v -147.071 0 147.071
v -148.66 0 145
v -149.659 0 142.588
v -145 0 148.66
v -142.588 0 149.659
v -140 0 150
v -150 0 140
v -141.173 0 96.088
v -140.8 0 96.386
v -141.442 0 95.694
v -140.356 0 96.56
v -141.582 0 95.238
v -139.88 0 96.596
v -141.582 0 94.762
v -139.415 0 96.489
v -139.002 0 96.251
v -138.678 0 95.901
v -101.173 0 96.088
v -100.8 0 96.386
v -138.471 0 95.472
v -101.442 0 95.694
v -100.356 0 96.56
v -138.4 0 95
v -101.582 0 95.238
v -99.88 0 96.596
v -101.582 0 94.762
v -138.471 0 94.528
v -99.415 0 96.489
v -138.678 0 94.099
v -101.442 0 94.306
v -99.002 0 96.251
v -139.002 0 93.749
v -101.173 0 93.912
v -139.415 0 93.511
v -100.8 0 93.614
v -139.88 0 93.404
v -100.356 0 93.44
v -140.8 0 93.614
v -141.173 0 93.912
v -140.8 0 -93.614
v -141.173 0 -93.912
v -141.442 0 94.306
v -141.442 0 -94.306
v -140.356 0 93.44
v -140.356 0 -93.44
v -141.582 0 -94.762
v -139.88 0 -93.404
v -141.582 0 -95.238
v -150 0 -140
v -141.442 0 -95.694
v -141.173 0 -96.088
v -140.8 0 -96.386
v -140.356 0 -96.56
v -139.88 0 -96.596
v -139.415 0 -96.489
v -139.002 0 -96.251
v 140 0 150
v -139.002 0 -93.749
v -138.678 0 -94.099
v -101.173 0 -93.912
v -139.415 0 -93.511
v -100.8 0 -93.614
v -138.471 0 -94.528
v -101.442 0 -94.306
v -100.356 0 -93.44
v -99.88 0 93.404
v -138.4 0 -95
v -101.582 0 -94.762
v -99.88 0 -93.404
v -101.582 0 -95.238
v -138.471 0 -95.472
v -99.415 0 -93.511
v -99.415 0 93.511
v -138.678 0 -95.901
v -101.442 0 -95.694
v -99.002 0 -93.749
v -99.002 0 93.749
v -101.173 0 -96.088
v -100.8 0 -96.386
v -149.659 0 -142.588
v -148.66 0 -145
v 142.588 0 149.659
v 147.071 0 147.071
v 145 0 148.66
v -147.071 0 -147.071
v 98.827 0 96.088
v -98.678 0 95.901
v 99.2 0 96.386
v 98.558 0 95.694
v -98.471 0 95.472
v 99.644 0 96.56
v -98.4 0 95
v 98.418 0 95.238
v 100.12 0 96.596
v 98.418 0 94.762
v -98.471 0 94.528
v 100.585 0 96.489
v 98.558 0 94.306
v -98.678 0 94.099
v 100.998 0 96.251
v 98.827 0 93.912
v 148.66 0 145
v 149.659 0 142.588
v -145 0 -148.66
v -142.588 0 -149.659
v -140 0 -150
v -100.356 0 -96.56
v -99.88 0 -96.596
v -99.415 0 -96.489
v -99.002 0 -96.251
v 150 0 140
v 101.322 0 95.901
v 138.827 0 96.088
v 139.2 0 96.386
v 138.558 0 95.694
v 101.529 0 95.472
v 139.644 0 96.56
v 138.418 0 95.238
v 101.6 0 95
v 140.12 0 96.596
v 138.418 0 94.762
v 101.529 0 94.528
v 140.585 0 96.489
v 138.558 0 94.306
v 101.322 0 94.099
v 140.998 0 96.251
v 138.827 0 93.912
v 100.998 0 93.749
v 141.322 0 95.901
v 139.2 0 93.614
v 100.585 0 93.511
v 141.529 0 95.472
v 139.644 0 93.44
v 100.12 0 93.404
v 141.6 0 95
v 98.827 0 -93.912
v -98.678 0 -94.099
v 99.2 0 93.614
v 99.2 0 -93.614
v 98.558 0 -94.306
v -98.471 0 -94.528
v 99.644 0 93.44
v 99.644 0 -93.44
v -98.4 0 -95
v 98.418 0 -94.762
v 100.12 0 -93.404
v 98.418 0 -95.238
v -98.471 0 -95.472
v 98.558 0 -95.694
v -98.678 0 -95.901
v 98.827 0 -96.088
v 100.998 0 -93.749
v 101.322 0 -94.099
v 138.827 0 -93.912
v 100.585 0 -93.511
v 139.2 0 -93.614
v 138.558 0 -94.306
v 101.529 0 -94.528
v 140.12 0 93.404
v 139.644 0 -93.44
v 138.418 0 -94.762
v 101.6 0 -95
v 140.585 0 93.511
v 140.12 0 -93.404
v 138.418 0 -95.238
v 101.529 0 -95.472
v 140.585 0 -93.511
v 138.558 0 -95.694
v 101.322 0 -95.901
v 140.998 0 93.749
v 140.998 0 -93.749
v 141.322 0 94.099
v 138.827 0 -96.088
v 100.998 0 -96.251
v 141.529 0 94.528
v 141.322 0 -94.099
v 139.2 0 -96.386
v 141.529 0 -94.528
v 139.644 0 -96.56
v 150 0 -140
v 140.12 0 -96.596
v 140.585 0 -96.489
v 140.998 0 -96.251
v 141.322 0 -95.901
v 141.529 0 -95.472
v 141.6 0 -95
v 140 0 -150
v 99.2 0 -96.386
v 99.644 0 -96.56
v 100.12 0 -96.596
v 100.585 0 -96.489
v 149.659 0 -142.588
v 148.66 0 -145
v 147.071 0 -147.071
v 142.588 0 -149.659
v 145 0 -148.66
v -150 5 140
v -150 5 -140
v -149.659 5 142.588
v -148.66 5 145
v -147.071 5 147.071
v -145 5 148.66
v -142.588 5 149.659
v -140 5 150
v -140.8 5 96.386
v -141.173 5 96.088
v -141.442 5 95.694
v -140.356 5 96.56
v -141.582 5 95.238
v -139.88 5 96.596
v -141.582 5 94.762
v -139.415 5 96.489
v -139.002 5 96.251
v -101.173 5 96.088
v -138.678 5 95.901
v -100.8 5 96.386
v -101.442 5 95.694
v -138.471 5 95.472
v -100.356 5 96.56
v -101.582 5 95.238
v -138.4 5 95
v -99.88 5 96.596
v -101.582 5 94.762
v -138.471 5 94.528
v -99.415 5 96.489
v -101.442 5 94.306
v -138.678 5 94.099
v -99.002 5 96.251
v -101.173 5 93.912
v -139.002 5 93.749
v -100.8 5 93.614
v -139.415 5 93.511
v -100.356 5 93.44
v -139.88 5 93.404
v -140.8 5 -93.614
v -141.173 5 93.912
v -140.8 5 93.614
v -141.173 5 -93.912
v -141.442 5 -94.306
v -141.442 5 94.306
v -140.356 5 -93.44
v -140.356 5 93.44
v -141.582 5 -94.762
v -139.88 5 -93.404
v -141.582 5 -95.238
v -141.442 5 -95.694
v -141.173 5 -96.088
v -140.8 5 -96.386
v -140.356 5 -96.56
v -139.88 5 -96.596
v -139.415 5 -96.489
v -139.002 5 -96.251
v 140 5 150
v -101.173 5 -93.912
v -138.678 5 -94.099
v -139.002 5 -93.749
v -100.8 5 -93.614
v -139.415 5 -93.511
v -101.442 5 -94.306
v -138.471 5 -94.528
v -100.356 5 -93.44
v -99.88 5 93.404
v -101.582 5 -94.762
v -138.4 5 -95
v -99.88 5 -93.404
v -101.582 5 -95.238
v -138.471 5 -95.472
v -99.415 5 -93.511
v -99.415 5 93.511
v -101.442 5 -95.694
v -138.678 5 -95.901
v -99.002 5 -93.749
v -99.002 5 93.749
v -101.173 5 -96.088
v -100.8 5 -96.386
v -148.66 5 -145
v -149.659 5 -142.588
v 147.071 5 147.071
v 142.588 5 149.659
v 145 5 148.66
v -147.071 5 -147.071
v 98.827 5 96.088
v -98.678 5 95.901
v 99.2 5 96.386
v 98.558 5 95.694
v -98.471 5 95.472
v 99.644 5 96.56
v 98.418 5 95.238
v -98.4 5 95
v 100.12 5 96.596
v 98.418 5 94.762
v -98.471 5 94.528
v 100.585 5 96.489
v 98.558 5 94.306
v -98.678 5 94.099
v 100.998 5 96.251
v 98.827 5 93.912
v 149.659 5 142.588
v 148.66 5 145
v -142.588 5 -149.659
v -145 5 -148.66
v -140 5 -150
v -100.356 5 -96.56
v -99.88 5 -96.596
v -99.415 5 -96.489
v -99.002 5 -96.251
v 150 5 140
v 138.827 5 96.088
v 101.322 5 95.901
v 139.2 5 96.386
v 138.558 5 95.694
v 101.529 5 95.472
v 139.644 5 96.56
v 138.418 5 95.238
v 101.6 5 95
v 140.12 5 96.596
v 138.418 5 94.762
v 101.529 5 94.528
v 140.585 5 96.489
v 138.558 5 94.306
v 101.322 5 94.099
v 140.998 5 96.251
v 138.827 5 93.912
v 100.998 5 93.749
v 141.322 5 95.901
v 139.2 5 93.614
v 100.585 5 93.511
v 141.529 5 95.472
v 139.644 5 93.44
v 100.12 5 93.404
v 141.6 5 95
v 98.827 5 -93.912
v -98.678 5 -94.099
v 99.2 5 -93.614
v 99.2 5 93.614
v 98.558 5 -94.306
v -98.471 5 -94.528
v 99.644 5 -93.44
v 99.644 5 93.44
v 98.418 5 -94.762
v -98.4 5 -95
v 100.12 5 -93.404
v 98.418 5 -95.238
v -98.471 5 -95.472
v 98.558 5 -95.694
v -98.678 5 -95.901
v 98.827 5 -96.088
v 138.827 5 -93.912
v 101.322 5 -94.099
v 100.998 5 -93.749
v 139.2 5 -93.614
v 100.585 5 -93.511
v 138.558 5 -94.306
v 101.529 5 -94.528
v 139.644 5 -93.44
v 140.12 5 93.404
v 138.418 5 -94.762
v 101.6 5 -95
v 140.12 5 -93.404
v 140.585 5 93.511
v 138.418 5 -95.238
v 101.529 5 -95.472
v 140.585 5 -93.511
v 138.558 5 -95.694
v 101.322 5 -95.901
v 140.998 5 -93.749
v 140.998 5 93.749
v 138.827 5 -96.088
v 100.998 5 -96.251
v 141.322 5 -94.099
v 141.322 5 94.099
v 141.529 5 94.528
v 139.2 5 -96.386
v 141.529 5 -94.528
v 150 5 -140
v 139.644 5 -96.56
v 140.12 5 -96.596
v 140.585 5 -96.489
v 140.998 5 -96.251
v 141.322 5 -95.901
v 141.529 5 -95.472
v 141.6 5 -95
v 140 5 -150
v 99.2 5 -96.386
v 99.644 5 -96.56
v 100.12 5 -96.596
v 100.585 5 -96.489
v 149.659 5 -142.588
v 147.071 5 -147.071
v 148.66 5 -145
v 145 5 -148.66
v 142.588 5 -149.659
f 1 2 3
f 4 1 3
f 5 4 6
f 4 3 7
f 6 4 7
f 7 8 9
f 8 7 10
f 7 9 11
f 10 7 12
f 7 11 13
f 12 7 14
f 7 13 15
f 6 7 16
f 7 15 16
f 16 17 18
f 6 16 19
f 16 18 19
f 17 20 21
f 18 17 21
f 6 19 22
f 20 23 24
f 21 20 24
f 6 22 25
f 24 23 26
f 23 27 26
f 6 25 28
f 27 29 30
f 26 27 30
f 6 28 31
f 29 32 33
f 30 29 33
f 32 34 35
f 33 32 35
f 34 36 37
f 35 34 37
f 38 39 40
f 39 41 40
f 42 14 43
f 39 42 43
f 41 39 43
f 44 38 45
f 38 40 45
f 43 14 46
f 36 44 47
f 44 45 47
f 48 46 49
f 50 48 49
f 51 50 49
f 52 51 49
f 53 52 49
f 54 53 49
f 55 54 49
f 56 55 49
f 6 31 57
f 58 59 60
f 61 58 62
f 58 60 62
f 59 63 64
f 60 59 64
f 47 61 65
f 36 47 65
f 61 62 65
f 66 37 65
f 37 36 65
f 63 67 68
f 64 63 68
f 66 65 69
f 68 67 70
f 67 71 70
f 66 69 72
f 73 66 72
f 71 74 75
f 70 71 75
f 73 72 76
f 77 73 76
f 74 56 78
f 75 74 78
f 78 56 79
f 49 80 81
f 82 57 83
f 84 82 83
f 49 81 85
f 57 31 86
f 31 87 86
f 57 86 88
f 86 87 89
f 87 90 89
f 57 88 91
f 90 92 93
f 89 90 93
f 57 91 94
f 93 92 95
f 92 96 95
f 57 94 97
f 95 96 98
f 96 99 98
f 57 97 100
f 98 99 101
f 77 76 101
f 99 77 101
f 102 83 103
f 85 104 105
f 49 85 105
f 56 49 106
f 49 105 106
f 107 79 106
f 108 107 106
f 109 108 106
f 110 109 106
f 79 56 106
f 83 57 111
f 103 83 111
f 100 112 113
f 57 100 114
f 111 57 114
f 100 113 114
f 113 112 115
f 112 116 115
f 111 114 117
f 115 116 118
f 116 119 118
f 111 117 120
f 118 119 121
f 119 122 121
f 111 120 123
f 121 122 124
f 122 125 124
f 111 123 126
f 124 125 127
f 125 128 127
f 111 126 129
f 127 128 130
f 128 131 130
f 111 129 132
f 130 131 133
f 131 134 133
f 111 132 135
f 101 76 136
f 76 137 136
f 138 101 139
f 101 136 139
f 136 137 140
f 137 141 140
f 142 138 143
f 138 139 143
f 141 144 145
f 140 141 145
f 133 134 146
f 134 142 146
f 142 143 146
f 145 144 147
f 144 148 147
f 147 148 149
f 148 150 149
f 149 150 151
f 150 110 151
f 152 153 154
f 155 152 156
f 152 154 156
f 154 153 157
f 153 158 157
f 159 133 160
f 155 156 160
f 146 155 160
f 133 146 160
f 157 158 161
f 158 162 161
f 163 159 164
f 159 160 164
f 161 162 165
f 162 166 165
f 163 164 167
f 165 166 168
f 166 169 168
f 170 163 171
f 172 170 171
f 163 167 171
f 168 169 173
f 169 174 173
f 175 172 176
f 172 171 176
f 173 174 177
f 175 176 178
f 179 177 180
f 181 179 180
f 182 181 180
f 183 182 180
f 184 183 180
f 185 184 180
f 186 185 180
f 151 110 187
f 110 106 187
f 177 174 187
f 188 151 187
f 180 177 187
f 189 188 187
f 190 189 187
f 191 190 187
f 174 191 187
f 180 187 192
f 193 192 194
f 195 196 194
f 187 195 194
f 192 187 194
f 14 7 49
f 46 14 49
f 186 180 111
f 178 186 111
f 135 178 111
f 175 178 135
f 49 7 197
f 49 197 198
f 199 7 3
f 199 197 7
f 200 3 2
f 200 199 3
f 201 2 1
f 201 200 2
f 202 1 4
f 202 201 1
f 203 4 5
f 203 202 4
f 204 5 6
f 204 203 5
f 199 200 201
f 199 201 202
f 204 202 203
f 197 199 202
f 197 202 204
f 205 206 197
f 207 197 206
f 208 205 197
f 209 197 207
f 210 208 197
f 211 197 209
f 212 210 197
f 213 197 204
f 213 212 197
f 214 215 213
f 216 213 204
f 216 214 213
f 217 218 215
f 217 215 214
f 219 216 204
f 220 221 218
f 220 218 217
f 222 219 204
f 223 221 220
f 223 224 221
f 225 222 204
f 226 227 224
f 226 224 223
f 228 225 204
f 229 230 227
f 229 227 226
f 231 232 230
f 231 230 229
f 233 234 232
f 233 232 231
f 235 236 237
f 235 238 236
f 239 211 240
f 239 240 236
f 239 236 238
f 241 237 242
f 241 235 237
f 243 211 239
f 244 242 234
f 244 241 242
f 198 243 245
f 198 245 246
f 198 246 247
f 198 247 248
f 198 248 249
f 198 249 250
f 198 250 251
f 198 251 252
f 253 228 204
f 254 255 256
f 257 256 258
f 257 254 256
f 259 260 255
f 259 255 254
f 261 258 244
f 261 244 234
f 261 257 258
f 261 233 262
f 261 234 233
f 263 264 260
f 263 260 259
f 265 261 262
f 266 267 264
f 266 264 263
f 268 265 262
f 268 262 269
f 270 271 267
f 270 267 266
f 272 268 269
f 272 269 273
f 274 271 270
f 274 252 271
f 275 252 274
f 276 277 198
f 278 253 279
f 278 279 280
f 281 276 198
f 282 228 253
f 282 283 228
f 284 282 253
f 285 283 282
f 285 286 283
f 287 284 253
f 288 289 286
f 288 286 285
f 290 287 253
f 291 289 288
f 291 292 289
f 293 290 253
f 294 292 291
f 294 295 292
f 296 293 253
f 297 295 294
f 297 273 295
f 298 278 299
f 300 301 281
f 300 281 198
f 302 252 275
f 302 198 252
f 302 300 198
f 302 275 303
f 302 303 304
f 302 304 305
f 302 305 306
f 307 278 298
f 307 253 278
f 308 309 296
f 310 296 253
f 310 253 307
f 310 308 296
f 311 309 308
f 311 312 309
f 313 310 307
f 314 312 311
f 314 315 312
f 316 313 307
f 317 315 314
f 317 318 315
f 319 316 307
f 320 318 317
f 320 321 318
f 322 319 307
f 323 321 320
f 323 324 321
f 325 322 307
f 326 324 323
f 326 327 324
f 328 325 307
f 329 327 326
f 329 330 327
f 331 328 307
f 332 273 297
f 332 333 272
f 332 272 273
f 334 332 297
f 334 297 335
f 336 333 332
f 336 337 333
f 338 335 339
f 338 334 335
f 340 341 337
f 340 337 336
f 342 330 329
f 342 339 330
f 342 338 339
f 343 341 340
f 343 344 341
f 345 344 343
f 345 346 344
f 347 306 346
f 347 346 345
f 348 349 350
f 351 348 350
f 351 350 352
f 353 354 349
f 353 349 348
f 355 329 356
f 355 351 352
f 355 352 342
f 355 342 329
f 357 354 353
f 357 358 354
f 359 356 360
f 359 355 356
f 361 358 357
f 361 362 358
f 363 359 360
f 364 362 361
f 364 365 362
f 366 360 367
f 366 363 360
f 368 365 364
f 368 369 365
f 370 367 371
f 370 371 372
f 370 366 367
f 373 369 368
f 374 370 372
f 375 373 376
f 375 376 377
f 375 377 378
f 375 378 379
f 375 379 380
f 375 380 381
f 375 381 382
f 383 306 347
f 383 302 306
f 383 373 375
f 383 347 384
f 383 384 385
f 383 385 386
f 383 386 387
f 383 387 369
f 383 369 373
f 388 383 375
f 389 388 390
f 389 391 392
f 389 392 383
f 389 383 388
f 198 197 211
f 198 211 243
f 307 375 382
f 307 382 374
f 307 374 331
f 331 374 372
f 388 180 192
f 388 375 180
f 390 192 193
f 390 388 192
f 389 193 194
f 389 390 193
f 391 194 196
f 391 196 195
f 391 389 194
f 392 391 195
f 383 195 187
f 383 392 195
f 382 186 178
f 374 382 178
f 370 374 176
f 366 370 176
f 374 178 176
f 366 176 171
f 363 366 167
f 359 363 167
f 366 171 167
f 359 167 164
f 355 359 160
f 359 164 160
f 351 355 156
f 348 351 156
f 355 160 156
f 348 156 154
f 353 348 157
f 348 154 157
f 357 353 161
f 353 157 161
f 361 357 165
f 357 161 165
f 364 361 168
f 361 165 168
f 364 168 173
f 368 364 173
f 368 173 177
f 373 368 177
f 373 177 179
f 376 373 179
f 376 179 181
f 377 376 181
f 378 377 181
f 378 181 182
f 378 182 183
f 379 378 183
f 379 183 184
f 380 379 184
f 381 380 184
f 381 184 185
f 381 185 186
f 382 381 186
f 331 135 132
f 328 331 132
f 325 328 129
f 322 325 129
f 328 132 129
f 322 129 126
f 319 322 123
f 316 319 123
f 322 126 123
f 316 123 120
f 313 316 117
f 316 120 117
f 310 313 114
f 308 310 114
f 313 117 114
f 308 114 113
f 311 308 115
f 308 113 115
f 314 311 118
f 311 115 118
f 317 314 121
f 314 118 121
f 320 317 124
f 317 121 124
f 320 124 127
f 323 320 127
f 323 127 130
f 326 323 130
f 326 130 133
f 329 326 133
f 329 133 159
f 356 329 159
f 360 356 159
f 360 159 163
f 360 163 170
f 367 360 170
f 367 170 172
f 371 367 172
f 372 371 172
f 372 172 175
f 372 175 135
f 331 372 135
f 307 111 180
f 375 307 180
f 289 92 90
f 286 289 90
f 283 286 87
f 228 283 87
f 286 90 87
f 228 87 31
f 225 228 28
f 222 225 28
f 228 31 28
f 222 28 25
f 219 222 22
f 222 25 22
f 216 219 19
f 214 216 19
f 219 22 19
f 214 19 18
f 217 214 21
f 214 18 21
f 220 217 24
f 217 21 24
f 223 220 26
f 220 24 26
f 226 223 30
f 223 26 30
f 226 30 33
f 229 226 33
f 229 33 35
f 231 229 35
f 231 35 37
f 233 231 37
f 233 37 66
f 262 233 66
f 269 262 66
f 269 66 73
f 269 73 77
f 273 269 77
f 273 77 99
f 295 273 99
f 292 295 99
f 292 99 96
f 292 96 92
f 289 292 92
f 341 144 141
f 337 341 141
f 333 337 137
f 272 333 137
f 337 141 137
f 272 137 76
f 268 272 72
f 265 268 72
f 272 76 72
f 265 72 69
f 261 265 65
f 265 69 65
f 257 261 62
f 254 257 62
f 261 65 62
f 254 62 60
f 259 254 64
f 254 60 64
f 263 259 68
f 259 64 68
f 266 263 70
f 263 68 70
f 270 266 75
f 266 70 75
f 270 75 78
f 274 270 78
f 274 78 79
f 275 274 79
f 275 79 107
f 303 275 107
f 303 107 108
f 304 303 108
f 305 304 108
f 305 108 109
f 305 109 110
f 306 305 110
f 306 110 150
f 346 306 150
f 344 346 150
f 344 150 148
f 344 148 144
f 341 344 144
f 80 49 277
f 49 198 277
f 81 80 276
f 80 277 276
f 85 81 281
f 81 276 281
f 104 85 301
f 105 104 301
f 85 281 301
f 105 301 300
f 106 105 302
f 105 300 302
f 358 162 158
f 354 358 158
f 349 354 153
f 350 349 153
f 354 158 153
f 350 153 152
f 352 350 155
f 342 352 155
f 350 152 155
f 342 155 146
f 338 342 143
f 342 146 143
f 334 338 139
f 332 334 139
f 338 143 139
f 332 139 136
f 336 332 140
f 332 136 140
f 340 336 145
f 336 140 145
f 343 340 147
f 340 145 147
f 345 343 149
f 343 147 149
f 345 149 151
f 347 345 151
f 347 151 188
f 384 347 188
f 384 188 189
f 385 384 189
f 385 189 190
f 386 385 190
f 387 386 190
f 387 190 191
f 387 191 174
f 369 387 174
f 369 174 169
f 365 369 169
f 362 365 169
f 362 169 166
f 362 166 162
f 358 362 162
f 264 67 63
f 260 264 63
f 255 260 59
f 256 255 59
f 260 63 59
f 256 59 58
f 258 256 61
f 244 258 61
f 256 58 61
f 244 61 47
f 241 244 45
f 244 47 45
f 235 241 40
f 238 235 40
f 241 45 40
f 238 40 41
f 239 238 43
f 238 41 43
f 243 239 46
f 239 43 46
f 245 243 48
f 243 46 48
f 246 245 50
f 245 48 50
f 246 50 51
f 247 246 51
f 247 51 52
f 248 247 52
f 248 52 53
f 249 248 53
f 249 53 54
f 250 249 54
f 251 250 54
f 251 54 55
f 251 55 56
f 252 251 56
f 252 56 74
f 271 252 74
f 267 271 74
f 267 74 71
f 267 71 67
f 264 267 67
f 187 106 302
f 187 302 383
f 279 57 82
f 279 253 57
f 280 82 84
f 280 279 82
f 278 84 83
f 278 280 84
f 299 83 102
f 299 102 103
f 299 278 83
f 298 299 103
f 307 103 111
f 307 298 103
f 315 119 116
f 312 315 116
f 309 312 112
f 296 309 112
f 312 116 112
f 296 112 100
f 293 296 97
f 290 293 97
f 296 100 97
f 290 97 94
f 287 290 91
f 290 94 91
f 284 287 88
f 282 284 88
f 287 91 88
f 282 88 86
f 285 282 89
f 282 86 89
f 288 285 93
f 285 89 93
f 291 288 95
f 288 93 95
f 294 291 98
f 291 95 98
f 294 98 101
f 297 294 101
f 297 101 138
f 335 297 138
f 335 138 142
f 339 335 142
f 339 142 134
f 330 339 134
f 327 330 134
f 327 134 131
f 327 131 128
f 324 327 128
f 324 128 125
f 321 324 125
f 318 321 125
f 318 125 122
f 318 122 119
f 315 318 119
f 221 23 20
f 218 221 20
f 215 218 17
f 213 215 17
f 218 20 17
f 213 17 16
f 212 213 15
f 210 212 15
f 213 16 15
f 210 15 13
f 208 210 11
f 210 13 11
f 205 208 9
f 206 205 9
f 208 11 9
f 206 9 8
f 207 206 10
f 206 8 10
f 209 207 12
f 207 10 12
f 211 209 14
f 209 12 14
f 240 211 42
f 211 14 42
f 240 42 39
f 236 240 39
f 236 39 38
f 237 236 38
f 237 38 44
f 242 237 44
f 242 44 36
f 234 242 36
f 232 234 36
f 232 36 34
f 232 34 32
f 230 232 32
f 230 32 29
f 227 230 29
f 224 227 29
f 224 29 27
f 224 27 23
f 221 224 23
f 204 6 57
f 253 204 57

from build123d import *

# Parameters (mm, degrees)
ESQUISSE1_W                     = 300
ESQUISSE1_H                     = 300
BOSS_EXTRU_1_DEPTH              = 5
CONG_1_R                        = 10
ESQUISSE2_R                     = 1.6
ENL_V_MAT_EXTRU_1_DEPTH         = 6
R_P_TITION_LIN_AIRE1_COUNT      = 2
R_P_TITION_LIN_AIRE1_PITCH      = 240
R_P_TITION_LIN_AIRE1_COUNT_DIR2 = 2
R_P_TITION_LIN_AIRE1_PITCH_DIR2 = 190


with BuildPart() as part:
    # Esquisse1 → Boss.-Extru.1 (new body)
    with BuildSketch(Plane(origin=(0, 0, 0), x_dir=(1, 0, 0), z_dir=(0, 1, 0))):
        Rectangle(ESQUISSE1_W, ESQUISSE1_H)
    extrude(amount=BOSS_EXTRU_1_DEPTH)

    # Congé1
    cong_1_edges = [part.edges().sort_by_distance(p)[0] for p in [
        (150, 2.5, 150),
        (-150, 2.5, 150),
        (-150, 2.5, -150),
        (150, 2.5, -150),
    ]]
    fillet(cong_1_edges, radius=CONG_1_R)

    # Esquisse2 → Enlèv. mat.-Extru.1 (cut, through all)
    with BuildSketch(Plane.XZ):
        with Locations((-140, 95)):
            Circle(ESQUISSE2_R)
        with Locations((-100, 95)):
            Circle(ESQUISSE2_R)
    enl_v_mat_extru_1 = extrude(amount=-ENL_V_MAT_EXTRU_1_DEPTH, mode=Mode.SUBTRACT)

    # Répétition linéaire1: Enl_v. mat.-Extru.1 2 × 2
    with Locations(*[(i * R_P_TITION_LIN_AIRE1_PITCH, 0, -j * R_P_TITION_LIN_AIRE1_PITCH_DIR2) for i in range(R_P_TITION_LIN_AIRE1_COUNT) for j in range(R_P_TITION_LIN_AIRE1_COUNT_DIR2) if (i, j) != (0, 0)]):
        add(enl_v_mat_extru_1, mode=Mode.SUBTRACT)


solid = part.part
